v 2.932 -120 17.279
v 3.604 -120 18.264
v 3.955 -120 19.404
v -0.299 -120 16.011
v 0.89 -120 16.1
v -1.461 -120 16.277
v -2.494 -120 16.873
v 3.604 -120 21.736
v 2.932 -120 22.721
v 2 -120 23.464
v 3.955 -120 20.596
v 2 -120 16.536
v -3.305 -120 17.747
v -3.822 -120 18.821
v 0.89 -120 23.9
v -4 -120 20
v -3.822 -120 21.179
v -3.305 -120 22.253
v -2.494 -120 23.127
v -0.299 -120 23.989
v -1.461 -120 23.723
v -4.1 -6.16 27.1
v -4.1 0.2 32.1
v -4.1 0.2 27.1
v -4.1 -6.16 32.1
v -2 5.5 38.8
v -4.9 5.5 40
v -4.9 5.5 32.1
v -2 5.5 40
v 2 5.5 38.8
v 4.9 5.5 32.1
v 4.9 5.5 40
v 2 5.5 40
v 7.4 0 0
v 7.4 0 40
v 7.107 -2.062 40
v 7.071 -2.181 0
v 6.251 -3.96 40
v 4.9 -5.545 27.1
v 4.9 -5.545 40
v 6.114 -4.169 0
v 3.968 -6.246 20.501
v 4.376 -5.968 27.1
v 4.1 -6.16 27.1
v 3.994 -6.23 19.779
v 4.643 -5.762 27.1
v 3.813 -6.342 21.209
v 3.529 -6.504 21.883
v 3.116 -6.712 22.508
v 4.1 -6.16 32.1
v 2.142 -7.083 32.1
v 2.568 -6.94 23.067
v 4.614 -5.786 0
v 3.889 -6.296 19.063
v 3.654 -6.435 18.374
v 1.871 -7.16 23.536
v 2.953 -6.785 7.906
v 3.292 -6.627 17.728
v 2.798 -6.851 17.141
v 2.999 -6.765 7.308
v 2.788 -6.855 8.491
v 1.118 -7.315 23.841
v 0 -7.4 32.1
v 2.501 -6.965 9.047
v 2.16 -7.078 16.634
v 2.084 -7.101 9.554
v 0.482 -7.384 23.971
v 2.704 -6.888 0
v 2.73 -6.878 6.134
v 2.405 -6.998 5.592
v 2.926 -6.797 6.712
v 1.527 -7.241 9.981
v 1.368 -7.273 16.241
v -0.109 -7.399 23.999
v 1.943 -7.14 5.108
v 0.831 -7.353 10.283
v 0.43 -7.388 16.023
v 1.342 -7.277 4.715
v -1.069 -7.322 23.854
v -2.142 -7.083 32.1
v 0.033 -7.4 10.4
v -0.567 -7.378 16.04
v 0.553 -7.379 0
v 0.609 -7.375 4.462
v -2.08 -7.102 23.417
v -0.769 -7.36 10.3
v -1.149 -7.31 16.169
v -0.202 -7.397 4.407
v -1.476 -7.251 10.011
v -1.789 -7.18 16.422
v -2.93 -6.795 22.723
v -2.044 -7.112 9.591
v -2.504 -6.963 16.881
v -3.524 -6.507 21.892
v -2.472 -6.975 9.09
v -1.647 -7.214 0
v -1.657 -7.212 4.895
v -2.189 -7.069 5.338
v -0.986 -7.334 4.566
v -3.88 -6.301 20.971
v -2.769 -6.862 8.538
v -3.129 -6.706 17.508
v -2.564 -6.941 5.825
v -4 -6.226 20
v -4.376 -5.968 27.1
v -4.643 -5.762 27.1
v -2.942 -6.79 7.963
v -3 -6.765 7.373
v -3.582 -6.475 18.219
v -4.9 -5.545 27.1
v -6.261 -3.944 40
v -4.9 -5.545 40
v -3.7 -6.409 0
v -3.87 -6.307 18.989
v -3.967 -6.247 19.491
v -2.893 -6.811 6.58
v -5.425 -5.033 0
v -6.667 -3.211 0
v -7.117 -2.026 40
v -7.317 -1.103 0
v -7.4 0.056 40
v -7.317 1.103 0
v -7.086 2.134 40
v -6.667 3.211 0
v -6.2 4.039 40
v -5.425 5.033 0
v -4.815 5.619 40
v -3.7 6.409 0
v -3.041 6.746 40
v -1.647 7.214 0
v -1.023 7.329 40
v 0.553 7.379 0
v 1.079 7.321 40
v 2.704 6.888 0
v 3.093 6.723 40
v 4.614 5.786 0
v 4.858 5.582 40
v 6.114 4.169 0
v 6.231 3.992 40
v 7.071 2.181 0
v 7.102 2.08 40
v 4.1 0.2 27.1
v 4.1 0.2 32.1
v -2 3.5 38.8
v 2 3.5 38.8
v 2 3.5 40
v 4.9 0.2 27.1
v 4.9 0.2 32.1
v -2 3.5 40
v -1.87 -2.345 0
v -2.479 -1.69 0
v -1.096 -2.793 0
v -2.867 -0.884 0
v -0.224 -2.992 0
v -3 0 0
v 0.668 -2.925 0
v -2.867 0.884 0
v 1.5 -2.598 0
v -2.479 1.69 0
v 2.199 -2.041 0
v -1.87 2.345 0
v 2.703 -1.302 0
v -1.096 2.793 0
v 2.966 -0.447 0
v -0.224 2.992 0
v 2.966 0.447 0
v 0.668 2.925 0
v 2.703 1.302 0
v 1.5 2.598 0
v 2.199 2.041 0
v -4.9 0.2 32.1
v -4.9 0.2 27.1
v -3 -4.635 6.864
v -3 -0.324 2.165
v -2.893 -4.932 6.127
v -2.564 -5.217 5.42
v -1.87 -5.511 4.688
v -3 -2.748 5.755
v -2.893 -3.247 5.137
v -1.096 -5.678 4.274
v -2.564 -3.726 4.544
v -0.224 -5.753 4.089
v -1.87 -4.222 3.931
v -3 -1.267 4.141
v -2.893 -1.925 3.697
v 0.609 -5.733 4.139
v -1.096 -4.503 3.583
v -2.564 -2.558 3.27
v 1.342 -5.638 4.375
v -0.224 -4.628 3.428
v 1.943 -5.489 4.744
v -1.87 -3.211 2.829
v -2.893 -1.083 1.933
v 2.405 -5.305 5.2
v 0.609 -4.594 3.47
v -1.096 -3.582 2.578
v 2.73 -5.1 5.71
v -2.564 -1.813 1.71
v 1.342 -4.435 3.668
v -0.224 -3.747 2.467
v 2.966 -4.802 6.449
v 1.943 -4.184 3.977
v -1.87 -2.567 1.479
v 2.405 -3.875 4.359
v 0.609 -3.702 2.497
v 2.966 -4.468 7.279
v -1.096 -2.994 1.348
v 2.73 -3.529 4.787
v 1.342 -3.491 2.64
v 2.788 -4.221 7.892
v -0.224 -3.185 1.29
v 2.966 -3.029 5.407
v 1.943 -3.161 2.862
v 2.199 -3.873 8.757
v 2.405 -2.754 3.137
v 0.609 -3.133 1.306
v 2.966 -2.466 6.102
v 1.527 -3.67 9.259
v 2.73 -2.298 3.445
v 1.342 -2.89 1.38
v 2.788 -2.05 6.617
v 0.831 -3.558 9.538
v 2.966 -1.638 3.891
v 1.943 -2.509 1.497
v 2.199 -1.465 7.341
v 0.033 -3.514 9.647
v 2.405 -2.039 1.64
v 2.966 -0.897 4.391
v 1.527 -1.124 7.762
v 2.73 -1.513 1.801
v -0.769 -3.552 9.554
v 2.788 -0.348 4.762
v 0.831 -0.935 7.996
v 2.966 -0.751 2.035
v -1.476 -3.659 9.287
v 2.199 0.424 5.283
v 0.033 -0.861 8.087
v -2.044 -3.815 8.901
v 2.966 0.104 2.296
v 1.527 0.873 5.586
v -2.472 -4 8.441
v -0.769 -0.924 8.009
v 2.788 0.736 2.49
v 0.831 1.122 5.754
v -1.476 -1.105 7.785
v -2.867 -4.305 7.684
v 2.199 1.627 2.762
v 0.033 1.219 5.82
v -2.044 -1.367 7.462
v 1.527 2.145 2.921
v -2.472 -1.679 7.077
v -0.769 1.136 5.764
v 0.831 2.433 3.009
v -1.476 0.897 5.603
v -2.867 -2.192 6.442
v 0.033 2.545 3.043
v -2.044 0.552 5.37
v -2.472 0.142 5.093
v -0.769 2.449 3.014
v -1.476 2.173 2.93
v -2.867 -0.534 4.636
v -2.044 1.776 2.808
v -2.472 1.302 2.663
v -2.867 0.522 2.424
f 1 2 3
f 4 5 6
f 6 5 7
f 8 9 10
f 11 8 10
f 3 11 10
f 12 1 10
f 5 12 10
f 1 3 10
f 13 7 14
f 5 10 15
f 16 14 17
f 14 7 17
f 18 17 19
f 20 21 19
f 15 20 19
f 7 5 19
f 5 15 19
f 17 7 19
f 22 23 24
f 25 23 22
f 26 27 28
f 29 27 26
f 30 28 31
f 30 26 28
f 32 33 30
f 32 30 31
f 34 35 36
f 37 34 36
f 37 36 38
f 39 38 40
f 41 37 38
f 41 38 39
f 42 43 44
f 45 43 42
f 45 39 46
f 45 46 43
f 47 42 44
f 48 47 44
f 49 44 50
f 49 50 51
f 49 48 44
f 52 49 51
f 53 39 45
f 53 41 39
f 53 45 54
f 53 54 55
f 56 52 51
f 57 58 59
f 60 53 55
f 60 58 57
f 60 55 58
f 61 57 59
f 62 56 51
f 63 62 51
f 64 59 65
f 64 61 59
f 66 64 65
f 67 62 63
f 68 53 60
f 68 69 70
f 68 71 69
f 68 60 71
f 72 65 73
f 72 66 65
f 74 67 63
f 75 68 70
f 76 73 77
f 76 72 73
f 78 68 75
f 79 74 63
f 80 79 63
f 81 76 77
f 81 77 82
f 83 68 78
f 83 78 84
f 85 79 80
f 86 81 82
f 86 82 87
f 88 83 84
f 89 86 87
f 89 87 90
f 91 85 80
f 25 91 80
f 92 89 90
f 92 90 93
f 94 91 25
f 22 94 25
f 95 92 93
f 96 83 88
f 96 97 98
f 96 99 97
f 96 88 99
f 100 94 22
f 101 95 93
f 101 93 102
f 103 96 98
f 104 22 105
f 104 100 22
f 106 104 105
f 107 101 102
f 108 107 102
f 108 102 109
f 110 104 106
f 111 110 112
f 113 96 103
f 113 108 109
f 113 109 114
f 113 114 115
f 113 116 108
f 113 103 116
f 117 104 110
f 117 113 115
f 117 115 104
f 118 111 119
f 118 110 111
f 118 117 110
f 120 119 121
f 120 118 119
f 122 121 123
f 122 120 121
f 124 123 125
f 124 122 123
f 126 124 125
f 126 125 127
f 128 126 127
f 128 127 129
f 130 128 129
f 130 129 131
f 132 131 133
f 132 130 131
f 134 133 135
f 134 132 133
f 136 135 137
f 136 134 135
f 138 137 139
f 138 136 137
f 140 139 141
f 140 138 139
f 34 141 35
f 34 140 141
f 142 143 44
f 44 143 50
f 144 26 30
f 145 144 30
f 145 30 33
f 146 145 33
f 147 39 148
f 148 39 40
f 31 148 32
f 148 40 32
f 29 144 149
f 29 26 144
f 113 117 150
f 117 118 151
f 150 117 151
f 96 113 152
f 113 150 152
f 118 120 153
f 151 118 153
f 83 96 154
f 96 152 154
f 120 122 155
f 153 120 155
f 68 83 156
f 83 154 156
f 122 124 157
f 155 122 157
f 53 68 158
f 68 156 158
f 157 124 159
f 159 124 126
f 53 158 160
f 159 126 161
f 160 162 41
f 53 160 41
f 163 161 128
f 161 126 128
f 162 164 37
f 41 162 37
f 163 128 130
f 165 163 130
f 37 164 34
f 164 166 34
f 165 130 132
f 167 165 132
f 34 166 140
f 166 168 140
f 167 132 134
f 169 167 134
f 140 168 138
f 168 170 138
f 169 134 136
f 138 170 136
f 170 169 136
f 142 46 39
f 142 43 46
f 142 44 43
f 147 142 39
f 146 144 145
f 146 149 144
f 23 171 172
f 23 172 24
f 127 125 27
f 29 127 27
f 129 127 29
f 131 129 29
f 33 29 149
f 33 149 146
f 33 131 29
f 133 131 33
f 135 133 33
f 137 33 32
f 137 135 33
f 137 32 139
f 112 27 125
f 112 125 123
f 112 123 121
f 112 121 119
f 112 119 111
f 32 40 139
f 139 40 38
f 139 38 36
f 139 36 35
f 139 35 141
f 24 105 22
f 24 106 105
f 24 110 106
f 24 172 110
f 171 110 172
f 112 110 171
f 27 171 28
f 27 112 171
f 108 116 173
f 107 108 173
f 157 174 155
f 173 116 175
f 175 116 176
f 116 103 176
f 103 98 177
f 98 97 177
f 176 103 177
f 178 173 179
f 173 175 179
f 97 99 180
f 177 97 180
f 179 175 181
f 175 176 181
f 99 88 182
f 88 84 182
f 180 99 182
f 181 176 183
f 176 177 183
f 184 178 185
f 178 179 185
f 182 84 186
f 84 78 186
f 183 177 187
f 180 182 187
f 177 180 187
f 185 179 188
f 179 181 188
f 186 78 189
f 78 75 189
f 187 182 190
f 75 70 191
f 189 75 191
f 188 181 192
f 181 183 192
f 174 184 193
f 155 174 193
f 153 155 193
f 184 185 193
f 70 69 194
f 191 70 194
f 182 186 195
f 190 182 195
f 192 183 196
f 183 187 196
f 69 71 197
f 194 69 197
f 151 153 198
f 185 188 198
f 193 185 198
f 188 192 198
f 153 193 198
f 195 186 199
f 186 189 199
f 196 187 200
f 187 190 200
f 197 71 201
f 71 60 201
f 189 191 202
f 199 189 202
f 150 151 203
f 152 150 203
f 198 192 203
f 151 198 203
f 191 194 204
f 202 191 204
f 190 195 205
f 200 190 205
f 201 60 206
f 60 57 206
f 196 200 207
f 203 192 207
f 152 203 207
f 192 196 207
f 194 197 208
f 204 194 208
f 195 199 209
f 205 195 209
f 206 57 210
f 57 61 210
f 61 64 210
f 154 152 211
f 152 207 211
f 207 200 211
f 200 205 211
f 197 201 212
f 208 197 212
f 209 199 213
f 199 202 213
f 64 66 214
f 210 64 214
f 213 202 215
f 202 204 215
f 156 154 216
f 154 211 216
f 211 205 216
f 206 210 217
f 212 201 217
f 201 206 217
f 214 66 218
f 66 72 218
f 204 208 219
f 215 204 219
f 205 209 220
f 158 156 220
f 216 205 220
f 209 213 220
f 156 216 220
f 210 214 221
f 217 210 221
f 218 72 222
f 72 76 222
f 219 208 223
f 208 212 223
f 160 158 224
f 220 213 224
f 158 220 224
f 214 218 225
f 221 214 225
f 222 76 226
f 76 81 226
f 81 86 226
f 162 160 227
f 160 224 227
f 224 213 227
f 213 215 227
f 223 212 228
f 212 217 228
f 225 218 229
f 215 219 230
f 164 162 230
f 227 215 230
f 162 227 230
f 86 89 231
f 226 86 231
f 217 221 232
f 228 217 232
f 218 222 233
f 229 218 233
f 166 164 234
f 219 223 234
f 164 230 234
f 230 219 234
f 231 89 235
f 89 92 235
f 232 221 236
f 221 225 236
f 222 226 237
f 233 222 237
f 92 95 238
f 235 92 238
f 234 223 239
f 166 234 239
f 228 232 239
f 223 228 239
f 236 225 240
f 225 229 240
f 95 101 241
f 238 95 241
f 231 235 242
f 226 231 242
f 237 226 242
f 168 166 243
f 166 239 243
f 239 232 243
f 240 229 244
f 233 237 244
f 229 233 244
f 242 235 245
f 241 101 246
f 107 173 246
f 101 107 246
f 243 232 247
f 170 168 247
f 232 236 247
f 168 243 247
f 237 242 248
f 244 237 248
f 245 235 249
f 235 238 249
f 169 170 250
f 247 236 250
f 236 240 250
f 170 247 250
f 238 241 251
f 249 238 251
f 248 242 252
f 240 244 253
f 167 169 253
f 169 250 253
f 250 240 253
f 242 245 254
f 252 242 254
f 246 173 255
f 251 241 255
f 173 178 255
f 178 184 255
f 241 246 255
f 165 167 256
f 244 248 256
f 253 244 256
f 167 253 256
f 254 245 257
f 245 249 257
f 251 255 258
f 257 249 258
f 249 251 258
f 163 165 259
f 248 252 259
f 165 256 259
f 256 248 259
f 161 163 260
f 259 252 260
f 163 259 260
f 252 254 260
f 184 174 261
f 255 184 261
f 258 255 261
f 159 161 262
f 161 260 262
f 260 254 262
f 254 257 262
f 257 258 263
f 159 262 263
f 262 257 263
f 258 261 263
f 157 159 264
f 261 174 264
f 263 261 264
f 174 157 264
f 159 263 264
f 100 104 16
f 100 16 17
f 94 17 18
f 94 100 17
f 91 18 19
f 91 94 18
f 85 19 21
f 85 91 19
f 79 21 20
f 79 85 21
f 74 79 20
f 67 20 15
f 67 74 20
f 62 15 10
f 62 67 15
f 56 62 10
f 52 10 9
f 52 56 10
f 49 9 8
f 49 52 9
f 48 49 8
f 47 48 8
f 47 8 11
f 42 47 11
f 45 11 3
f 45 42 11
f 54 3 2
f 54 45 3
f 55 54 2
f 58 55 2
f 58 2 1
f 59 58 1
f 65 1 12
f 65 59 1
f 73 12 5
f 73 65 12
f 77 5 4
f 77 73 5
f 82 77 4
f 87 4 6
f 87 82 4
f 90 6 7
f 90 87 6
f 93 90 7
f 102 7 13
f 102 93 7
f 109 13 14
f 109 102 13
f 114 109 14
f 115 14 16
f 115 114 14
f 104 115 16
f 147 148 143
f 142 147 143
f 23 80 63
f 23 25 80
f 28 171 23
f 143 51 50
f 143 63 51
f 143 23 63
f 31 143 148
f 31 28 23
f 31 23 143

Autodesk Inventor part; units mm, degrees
ref_plane "YZ Plane" through (0, 0, 0) normal (1, 0, 0) x (0, 1, 0)
ref_plane "XZ Plane" through (0, 0, 0) normal (0, 1, 0) x (-1, 0, 0)
ref_plane "XY Plane" through (0, 0, 0) normal (0, 0, 1) x (1, 0, 0)
sketch "Sketch1" plane through (0, 0, 0) normal (0, 0, 1) x (1, 0, 0)
  circle A0 centre (0, 0) radius 7.4
  dimension "d0" = 14.8
extrude "Extrusion1" add sketch "Sketch1" along normal blind 40
sketch "Sketch2" plane through (0, 0, 40) normal (0, 0, 1) x (1, 0, 0)
  line L0 (0, 0) -> (-4.9, 0)
  line L1 (0, 0) -> (4.9, 0)
  line L2 (0, 0) -> (0, 5.5)
  line L3 (0, 5.5) -> (-4.9, 5.5)
  line L4 (-4.9, 5.5) -> (-4.9, 0)
  line L5 (0, 5.5) -> (4.9, 5.5)
  line L6 (4.9, 5.5) -> (4.9, 0)
  line L7 (-4.9, 0) -> (-4.9, -10)
  line L8 (-4.9, -10) -> (4.9, -10)
  line L9 (4.9, -10) -> (4.9, 0)
  dimension "d3" = 4.9
  dimension "d4" = 4.9
  dimension "d5" = 5.5
  dimension "d6" = 10
extrude "Extrusion2" cut sketch "Sketch2" against normal blind 7.9
sketch "Sketch3" plane through (0, 0, 32.1) normal (0, 0, 1) x (1, 0, 0)
  line L0 (-4.9, -5.5453) -> (-4.9, 5.5) projected
  line L1 (-4.9, 5.5) -> (-4.9, 0.2)
  line L2 (-4.9, 0.2) -> (-4.1, 0.2)
  line L3 (-4.1, 0.2) -> (-4.1, -7.8)
  line L4 (-4.1, -7.8) -> (-4.9, -7.8)
  line L5 (-4.9, -7.8) -> (-4.9, 0.2)
  line L6 (4.9, 5.5) -> (4.9, -5.5453) projected
  line L7 (4.9, 5.5) -> (4.9, 0.2)
  line L8 (4.9, 0.2) -> (4.1, 0.2)
  line L9 (4.1, 0.2) -> (4.1, -7.8)
  line L10 (4.1, -7.8) -> (4.9, -7.8)
  line L11 (4.9, 0.2) -> (4.9, -7.8)
  point P0 (0, 0)
  dimension "d9" = 5.3
  dimension "d10" = 0.8
  dimension "d11" = 8
  dimension "d12" = 0.8
  dimension "d13" = 5.3
  dimension "d14" = 0.8
  dimension "d15" = 8
extrude "Extrusion3" cut sketch "Sketch3" against normal blind 5
sketch "Sketch4" plane through (-4.9, 5.5, 40) normal (0, -1, 0) x (1, 0, 0)
  line L0 (12.3, 0) -> (-2.5, 0) projected
  line L1 (6.9, 0) -> (2.9, 0)
  line L2 (4.9, 0) -> (4.9, -1.2)
  line L3 (4.9, -1.2) -> (6.9, -1.2)
  line L4 (6.9, -1.2) -> (6.9, 0)
  line L5 (4.9, -1.2) -> (2.9, -1.2)
  line L6 (2.9, -1.2) -> (2.9, 0)
  point P0 (4.9, -40)
  point P1 (9.8, 0)
  point P2 (0, 0)
  dimension "d18" = 1.2
  dimension "d19" = 2
  dimension "d20" = 2
extrude "Extrusion4" add sketch "Sketch4" along normal blind 2
sketch "Sketch5" plane through (0, 0, 0) normal (0, 1, 0) x (-1, 0, 0)
  line L0 (-7.4, 0) -> (-7.4, 40) projected
  line L1 (-7.4, 40) -> (-7.4, 0)
  line L2 (-7.4, 20) -> (7.4, 20)
  line L3 (7.4, 0) -> (7.4, 40) projected
  circle A0 centre (0, 20) radius 4
  point P0 (0, 0)
  dimension "d23" = 8
extrude "Extrusion5" add sketch "Sketch5" against normal blind 120
ref_plane "Work Plane1" through (4.9, -5.5453, 27.1) normal (0, -1, 0) x (1, 0, 0)
sketch "Sketch7" plane through (0, 0, 0) normal (0, 0, -1) x (-1, 0, 0)
  circle A0 centre (0, 0) radius 3
  dimension "d26" = 6
ref_plane "Work Plane2" through (0, 0, 0) normal (-1, 0, 0) x (0, 0, -1)
sketch "Sketch8" plane through (0, 0, 0) normal (-1, 0, 0) x (0, 0, -1)
  line L0 (0, -7.4) -> (0, 7.4) projected
  circle A0 centre (0, 7.4) radius 7.4
  point P0 (0, 0)
sweep "Sweep1" cut profiles "Sketch7" path "Sketch8" path curves A0
equation "\"BendRadius\" = Thickness"
equation "\"BendReliefWidth\" = Thickness"
equation "\"BendReliefDepth\" = 0.5 * Thickness"
equation "\"CornerReliefSize\" = 4 * Thickness"
equation "\"MinimumRemnant\" = 2 * Thickness"
equation "\"TransitionRadius\" = BendRadius"
equation "\"JacobiRadiusSize\" = BendRadius"
equation "\"GapSize\" = Thickness"
equation "\"Thickness\" = 0.5"
properties part number "rotor1"
